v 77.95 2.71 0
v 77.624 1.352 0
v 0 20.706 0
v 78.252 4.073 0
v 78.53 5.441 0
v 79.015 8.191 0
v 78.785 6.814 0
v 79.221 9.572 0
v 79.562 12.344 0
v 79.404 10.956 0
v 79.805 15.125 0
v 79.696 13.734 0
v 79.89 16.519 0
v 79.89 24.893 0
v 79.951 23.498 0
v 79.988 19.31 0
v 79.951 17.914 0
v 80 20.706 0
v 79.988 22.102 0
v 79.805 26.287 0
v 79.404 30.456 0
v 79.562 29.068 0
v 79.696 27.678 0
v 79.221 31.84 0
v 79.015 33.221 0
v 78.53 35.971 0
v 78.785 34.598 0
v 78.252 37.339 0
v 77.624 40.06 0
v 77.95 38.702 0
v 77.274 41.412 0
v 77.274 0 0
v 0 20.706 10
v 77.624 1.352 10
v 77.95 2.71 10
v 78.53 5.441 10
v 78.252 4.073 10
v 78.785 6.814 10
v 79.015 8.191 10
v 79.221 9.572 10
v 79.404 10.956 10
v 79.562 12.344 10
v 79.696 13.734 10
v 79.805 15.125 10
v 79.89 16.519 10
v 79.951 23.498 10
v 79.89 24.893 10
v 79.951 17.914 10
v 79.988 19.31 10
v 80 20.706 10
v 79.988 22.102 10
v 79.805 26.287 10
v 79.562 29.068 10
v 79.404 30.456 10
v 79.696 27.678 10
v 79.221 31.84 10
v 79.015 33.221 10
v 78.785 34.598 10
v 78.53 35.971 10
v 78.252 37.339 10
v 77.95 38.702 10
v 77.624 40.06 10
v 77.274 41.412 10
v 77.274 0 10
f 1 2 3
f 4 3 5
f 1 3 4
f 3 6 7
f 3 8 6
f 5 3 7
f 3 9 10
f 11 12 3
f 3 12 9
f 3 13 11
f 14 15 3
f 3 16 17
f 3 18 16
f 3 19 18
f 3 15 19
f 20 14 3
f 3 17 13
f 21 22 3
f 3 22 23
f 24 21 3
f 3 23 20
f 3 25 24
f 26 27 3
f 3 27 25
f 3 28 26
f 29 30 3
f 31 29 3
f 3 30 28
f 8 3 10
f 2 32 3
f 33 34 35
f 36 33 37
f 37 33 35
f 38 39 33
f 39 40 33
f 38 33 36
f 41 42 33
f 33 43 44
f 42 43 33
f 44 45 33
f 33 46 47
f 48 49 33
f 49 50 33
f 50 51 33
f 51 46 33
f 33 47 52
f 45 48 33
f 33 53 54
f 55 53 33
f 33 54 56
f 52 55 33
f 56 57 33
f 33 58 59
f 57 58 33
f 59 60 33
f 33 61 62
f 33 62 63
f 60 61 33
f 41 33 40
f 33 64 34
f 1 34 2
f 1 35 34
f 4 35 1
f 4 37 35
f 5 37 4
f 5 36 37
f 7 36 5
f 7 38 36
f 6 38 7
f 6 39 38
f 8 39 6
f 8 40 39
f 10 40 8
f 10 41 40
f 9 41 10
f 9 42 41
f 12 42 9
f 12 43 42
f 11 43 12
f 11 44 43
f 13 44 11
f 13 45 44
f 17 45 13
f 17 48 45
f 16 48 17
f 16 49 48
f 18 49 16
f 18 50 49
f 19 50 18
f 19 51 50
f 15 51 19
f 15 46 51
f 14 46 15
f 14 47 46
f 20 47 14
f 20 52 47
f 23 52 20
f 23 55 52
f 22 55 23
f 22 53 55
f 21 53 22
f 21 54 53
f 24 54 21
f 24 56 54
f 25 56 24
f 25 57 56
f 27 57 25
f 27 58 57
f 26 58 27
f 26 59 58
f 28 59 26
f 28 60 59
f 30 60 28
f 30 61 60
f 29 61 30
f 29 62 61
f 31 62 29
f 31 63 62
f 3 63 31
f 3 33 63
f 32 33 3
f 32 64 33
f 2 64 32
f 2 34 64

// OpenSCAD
$fn = 32;

// ----------------------------------------------------------------------
// Arc profile plate: sector, 32 points
// ----------------------------------------------------------------------

// --- parameters (mm) ---
sector_angle = 30;        // sector angle, degrees
sector_r = 80;            // outer radius
arc_step = 1;             // sampling step of the arc, degrees
plate_t = 10;             // plate thickness, Z

bbox_x = 2 * sector_r * sin(sector_angle / 2);  // chord of the sector
bbox_y = sector_r;  // depth of the sector (apex to arc)

profile = [[77.274, 0], [77.624, 1.352], [77.95, 2.71], [78.252, 4.073], [78.53, 5.441], [78.785, 6.814], [79.015, 8.191], [79.221, 9.572], [79.404, 10.956], [79.562, 12.344], [79.696, 13.734], [79.805, 15.125], [79.89, 16.519], [79.951, 17.914], [79.988, 19.31], [80, 20.706], [79.988, 22.102], [79.951, 23.498], [79.89, 24.893], [79.805, 26.287], [79.696, 27.678], [79.562, 29.068], [79.404, 30.456], [79.221, 31.84], [79.015, 33.221], [78.785, 34.598], [78.53, 35.971], [78.252, 37.339], [77.95, 38.702], [77.624, 40.06], [77.274, 41.412], [0, 20.706]];  // primary outline, 32 points, counter clockwise

// --- the one profile operation ---
linear_extrude(height = plate_t) polygon(points = profile);
